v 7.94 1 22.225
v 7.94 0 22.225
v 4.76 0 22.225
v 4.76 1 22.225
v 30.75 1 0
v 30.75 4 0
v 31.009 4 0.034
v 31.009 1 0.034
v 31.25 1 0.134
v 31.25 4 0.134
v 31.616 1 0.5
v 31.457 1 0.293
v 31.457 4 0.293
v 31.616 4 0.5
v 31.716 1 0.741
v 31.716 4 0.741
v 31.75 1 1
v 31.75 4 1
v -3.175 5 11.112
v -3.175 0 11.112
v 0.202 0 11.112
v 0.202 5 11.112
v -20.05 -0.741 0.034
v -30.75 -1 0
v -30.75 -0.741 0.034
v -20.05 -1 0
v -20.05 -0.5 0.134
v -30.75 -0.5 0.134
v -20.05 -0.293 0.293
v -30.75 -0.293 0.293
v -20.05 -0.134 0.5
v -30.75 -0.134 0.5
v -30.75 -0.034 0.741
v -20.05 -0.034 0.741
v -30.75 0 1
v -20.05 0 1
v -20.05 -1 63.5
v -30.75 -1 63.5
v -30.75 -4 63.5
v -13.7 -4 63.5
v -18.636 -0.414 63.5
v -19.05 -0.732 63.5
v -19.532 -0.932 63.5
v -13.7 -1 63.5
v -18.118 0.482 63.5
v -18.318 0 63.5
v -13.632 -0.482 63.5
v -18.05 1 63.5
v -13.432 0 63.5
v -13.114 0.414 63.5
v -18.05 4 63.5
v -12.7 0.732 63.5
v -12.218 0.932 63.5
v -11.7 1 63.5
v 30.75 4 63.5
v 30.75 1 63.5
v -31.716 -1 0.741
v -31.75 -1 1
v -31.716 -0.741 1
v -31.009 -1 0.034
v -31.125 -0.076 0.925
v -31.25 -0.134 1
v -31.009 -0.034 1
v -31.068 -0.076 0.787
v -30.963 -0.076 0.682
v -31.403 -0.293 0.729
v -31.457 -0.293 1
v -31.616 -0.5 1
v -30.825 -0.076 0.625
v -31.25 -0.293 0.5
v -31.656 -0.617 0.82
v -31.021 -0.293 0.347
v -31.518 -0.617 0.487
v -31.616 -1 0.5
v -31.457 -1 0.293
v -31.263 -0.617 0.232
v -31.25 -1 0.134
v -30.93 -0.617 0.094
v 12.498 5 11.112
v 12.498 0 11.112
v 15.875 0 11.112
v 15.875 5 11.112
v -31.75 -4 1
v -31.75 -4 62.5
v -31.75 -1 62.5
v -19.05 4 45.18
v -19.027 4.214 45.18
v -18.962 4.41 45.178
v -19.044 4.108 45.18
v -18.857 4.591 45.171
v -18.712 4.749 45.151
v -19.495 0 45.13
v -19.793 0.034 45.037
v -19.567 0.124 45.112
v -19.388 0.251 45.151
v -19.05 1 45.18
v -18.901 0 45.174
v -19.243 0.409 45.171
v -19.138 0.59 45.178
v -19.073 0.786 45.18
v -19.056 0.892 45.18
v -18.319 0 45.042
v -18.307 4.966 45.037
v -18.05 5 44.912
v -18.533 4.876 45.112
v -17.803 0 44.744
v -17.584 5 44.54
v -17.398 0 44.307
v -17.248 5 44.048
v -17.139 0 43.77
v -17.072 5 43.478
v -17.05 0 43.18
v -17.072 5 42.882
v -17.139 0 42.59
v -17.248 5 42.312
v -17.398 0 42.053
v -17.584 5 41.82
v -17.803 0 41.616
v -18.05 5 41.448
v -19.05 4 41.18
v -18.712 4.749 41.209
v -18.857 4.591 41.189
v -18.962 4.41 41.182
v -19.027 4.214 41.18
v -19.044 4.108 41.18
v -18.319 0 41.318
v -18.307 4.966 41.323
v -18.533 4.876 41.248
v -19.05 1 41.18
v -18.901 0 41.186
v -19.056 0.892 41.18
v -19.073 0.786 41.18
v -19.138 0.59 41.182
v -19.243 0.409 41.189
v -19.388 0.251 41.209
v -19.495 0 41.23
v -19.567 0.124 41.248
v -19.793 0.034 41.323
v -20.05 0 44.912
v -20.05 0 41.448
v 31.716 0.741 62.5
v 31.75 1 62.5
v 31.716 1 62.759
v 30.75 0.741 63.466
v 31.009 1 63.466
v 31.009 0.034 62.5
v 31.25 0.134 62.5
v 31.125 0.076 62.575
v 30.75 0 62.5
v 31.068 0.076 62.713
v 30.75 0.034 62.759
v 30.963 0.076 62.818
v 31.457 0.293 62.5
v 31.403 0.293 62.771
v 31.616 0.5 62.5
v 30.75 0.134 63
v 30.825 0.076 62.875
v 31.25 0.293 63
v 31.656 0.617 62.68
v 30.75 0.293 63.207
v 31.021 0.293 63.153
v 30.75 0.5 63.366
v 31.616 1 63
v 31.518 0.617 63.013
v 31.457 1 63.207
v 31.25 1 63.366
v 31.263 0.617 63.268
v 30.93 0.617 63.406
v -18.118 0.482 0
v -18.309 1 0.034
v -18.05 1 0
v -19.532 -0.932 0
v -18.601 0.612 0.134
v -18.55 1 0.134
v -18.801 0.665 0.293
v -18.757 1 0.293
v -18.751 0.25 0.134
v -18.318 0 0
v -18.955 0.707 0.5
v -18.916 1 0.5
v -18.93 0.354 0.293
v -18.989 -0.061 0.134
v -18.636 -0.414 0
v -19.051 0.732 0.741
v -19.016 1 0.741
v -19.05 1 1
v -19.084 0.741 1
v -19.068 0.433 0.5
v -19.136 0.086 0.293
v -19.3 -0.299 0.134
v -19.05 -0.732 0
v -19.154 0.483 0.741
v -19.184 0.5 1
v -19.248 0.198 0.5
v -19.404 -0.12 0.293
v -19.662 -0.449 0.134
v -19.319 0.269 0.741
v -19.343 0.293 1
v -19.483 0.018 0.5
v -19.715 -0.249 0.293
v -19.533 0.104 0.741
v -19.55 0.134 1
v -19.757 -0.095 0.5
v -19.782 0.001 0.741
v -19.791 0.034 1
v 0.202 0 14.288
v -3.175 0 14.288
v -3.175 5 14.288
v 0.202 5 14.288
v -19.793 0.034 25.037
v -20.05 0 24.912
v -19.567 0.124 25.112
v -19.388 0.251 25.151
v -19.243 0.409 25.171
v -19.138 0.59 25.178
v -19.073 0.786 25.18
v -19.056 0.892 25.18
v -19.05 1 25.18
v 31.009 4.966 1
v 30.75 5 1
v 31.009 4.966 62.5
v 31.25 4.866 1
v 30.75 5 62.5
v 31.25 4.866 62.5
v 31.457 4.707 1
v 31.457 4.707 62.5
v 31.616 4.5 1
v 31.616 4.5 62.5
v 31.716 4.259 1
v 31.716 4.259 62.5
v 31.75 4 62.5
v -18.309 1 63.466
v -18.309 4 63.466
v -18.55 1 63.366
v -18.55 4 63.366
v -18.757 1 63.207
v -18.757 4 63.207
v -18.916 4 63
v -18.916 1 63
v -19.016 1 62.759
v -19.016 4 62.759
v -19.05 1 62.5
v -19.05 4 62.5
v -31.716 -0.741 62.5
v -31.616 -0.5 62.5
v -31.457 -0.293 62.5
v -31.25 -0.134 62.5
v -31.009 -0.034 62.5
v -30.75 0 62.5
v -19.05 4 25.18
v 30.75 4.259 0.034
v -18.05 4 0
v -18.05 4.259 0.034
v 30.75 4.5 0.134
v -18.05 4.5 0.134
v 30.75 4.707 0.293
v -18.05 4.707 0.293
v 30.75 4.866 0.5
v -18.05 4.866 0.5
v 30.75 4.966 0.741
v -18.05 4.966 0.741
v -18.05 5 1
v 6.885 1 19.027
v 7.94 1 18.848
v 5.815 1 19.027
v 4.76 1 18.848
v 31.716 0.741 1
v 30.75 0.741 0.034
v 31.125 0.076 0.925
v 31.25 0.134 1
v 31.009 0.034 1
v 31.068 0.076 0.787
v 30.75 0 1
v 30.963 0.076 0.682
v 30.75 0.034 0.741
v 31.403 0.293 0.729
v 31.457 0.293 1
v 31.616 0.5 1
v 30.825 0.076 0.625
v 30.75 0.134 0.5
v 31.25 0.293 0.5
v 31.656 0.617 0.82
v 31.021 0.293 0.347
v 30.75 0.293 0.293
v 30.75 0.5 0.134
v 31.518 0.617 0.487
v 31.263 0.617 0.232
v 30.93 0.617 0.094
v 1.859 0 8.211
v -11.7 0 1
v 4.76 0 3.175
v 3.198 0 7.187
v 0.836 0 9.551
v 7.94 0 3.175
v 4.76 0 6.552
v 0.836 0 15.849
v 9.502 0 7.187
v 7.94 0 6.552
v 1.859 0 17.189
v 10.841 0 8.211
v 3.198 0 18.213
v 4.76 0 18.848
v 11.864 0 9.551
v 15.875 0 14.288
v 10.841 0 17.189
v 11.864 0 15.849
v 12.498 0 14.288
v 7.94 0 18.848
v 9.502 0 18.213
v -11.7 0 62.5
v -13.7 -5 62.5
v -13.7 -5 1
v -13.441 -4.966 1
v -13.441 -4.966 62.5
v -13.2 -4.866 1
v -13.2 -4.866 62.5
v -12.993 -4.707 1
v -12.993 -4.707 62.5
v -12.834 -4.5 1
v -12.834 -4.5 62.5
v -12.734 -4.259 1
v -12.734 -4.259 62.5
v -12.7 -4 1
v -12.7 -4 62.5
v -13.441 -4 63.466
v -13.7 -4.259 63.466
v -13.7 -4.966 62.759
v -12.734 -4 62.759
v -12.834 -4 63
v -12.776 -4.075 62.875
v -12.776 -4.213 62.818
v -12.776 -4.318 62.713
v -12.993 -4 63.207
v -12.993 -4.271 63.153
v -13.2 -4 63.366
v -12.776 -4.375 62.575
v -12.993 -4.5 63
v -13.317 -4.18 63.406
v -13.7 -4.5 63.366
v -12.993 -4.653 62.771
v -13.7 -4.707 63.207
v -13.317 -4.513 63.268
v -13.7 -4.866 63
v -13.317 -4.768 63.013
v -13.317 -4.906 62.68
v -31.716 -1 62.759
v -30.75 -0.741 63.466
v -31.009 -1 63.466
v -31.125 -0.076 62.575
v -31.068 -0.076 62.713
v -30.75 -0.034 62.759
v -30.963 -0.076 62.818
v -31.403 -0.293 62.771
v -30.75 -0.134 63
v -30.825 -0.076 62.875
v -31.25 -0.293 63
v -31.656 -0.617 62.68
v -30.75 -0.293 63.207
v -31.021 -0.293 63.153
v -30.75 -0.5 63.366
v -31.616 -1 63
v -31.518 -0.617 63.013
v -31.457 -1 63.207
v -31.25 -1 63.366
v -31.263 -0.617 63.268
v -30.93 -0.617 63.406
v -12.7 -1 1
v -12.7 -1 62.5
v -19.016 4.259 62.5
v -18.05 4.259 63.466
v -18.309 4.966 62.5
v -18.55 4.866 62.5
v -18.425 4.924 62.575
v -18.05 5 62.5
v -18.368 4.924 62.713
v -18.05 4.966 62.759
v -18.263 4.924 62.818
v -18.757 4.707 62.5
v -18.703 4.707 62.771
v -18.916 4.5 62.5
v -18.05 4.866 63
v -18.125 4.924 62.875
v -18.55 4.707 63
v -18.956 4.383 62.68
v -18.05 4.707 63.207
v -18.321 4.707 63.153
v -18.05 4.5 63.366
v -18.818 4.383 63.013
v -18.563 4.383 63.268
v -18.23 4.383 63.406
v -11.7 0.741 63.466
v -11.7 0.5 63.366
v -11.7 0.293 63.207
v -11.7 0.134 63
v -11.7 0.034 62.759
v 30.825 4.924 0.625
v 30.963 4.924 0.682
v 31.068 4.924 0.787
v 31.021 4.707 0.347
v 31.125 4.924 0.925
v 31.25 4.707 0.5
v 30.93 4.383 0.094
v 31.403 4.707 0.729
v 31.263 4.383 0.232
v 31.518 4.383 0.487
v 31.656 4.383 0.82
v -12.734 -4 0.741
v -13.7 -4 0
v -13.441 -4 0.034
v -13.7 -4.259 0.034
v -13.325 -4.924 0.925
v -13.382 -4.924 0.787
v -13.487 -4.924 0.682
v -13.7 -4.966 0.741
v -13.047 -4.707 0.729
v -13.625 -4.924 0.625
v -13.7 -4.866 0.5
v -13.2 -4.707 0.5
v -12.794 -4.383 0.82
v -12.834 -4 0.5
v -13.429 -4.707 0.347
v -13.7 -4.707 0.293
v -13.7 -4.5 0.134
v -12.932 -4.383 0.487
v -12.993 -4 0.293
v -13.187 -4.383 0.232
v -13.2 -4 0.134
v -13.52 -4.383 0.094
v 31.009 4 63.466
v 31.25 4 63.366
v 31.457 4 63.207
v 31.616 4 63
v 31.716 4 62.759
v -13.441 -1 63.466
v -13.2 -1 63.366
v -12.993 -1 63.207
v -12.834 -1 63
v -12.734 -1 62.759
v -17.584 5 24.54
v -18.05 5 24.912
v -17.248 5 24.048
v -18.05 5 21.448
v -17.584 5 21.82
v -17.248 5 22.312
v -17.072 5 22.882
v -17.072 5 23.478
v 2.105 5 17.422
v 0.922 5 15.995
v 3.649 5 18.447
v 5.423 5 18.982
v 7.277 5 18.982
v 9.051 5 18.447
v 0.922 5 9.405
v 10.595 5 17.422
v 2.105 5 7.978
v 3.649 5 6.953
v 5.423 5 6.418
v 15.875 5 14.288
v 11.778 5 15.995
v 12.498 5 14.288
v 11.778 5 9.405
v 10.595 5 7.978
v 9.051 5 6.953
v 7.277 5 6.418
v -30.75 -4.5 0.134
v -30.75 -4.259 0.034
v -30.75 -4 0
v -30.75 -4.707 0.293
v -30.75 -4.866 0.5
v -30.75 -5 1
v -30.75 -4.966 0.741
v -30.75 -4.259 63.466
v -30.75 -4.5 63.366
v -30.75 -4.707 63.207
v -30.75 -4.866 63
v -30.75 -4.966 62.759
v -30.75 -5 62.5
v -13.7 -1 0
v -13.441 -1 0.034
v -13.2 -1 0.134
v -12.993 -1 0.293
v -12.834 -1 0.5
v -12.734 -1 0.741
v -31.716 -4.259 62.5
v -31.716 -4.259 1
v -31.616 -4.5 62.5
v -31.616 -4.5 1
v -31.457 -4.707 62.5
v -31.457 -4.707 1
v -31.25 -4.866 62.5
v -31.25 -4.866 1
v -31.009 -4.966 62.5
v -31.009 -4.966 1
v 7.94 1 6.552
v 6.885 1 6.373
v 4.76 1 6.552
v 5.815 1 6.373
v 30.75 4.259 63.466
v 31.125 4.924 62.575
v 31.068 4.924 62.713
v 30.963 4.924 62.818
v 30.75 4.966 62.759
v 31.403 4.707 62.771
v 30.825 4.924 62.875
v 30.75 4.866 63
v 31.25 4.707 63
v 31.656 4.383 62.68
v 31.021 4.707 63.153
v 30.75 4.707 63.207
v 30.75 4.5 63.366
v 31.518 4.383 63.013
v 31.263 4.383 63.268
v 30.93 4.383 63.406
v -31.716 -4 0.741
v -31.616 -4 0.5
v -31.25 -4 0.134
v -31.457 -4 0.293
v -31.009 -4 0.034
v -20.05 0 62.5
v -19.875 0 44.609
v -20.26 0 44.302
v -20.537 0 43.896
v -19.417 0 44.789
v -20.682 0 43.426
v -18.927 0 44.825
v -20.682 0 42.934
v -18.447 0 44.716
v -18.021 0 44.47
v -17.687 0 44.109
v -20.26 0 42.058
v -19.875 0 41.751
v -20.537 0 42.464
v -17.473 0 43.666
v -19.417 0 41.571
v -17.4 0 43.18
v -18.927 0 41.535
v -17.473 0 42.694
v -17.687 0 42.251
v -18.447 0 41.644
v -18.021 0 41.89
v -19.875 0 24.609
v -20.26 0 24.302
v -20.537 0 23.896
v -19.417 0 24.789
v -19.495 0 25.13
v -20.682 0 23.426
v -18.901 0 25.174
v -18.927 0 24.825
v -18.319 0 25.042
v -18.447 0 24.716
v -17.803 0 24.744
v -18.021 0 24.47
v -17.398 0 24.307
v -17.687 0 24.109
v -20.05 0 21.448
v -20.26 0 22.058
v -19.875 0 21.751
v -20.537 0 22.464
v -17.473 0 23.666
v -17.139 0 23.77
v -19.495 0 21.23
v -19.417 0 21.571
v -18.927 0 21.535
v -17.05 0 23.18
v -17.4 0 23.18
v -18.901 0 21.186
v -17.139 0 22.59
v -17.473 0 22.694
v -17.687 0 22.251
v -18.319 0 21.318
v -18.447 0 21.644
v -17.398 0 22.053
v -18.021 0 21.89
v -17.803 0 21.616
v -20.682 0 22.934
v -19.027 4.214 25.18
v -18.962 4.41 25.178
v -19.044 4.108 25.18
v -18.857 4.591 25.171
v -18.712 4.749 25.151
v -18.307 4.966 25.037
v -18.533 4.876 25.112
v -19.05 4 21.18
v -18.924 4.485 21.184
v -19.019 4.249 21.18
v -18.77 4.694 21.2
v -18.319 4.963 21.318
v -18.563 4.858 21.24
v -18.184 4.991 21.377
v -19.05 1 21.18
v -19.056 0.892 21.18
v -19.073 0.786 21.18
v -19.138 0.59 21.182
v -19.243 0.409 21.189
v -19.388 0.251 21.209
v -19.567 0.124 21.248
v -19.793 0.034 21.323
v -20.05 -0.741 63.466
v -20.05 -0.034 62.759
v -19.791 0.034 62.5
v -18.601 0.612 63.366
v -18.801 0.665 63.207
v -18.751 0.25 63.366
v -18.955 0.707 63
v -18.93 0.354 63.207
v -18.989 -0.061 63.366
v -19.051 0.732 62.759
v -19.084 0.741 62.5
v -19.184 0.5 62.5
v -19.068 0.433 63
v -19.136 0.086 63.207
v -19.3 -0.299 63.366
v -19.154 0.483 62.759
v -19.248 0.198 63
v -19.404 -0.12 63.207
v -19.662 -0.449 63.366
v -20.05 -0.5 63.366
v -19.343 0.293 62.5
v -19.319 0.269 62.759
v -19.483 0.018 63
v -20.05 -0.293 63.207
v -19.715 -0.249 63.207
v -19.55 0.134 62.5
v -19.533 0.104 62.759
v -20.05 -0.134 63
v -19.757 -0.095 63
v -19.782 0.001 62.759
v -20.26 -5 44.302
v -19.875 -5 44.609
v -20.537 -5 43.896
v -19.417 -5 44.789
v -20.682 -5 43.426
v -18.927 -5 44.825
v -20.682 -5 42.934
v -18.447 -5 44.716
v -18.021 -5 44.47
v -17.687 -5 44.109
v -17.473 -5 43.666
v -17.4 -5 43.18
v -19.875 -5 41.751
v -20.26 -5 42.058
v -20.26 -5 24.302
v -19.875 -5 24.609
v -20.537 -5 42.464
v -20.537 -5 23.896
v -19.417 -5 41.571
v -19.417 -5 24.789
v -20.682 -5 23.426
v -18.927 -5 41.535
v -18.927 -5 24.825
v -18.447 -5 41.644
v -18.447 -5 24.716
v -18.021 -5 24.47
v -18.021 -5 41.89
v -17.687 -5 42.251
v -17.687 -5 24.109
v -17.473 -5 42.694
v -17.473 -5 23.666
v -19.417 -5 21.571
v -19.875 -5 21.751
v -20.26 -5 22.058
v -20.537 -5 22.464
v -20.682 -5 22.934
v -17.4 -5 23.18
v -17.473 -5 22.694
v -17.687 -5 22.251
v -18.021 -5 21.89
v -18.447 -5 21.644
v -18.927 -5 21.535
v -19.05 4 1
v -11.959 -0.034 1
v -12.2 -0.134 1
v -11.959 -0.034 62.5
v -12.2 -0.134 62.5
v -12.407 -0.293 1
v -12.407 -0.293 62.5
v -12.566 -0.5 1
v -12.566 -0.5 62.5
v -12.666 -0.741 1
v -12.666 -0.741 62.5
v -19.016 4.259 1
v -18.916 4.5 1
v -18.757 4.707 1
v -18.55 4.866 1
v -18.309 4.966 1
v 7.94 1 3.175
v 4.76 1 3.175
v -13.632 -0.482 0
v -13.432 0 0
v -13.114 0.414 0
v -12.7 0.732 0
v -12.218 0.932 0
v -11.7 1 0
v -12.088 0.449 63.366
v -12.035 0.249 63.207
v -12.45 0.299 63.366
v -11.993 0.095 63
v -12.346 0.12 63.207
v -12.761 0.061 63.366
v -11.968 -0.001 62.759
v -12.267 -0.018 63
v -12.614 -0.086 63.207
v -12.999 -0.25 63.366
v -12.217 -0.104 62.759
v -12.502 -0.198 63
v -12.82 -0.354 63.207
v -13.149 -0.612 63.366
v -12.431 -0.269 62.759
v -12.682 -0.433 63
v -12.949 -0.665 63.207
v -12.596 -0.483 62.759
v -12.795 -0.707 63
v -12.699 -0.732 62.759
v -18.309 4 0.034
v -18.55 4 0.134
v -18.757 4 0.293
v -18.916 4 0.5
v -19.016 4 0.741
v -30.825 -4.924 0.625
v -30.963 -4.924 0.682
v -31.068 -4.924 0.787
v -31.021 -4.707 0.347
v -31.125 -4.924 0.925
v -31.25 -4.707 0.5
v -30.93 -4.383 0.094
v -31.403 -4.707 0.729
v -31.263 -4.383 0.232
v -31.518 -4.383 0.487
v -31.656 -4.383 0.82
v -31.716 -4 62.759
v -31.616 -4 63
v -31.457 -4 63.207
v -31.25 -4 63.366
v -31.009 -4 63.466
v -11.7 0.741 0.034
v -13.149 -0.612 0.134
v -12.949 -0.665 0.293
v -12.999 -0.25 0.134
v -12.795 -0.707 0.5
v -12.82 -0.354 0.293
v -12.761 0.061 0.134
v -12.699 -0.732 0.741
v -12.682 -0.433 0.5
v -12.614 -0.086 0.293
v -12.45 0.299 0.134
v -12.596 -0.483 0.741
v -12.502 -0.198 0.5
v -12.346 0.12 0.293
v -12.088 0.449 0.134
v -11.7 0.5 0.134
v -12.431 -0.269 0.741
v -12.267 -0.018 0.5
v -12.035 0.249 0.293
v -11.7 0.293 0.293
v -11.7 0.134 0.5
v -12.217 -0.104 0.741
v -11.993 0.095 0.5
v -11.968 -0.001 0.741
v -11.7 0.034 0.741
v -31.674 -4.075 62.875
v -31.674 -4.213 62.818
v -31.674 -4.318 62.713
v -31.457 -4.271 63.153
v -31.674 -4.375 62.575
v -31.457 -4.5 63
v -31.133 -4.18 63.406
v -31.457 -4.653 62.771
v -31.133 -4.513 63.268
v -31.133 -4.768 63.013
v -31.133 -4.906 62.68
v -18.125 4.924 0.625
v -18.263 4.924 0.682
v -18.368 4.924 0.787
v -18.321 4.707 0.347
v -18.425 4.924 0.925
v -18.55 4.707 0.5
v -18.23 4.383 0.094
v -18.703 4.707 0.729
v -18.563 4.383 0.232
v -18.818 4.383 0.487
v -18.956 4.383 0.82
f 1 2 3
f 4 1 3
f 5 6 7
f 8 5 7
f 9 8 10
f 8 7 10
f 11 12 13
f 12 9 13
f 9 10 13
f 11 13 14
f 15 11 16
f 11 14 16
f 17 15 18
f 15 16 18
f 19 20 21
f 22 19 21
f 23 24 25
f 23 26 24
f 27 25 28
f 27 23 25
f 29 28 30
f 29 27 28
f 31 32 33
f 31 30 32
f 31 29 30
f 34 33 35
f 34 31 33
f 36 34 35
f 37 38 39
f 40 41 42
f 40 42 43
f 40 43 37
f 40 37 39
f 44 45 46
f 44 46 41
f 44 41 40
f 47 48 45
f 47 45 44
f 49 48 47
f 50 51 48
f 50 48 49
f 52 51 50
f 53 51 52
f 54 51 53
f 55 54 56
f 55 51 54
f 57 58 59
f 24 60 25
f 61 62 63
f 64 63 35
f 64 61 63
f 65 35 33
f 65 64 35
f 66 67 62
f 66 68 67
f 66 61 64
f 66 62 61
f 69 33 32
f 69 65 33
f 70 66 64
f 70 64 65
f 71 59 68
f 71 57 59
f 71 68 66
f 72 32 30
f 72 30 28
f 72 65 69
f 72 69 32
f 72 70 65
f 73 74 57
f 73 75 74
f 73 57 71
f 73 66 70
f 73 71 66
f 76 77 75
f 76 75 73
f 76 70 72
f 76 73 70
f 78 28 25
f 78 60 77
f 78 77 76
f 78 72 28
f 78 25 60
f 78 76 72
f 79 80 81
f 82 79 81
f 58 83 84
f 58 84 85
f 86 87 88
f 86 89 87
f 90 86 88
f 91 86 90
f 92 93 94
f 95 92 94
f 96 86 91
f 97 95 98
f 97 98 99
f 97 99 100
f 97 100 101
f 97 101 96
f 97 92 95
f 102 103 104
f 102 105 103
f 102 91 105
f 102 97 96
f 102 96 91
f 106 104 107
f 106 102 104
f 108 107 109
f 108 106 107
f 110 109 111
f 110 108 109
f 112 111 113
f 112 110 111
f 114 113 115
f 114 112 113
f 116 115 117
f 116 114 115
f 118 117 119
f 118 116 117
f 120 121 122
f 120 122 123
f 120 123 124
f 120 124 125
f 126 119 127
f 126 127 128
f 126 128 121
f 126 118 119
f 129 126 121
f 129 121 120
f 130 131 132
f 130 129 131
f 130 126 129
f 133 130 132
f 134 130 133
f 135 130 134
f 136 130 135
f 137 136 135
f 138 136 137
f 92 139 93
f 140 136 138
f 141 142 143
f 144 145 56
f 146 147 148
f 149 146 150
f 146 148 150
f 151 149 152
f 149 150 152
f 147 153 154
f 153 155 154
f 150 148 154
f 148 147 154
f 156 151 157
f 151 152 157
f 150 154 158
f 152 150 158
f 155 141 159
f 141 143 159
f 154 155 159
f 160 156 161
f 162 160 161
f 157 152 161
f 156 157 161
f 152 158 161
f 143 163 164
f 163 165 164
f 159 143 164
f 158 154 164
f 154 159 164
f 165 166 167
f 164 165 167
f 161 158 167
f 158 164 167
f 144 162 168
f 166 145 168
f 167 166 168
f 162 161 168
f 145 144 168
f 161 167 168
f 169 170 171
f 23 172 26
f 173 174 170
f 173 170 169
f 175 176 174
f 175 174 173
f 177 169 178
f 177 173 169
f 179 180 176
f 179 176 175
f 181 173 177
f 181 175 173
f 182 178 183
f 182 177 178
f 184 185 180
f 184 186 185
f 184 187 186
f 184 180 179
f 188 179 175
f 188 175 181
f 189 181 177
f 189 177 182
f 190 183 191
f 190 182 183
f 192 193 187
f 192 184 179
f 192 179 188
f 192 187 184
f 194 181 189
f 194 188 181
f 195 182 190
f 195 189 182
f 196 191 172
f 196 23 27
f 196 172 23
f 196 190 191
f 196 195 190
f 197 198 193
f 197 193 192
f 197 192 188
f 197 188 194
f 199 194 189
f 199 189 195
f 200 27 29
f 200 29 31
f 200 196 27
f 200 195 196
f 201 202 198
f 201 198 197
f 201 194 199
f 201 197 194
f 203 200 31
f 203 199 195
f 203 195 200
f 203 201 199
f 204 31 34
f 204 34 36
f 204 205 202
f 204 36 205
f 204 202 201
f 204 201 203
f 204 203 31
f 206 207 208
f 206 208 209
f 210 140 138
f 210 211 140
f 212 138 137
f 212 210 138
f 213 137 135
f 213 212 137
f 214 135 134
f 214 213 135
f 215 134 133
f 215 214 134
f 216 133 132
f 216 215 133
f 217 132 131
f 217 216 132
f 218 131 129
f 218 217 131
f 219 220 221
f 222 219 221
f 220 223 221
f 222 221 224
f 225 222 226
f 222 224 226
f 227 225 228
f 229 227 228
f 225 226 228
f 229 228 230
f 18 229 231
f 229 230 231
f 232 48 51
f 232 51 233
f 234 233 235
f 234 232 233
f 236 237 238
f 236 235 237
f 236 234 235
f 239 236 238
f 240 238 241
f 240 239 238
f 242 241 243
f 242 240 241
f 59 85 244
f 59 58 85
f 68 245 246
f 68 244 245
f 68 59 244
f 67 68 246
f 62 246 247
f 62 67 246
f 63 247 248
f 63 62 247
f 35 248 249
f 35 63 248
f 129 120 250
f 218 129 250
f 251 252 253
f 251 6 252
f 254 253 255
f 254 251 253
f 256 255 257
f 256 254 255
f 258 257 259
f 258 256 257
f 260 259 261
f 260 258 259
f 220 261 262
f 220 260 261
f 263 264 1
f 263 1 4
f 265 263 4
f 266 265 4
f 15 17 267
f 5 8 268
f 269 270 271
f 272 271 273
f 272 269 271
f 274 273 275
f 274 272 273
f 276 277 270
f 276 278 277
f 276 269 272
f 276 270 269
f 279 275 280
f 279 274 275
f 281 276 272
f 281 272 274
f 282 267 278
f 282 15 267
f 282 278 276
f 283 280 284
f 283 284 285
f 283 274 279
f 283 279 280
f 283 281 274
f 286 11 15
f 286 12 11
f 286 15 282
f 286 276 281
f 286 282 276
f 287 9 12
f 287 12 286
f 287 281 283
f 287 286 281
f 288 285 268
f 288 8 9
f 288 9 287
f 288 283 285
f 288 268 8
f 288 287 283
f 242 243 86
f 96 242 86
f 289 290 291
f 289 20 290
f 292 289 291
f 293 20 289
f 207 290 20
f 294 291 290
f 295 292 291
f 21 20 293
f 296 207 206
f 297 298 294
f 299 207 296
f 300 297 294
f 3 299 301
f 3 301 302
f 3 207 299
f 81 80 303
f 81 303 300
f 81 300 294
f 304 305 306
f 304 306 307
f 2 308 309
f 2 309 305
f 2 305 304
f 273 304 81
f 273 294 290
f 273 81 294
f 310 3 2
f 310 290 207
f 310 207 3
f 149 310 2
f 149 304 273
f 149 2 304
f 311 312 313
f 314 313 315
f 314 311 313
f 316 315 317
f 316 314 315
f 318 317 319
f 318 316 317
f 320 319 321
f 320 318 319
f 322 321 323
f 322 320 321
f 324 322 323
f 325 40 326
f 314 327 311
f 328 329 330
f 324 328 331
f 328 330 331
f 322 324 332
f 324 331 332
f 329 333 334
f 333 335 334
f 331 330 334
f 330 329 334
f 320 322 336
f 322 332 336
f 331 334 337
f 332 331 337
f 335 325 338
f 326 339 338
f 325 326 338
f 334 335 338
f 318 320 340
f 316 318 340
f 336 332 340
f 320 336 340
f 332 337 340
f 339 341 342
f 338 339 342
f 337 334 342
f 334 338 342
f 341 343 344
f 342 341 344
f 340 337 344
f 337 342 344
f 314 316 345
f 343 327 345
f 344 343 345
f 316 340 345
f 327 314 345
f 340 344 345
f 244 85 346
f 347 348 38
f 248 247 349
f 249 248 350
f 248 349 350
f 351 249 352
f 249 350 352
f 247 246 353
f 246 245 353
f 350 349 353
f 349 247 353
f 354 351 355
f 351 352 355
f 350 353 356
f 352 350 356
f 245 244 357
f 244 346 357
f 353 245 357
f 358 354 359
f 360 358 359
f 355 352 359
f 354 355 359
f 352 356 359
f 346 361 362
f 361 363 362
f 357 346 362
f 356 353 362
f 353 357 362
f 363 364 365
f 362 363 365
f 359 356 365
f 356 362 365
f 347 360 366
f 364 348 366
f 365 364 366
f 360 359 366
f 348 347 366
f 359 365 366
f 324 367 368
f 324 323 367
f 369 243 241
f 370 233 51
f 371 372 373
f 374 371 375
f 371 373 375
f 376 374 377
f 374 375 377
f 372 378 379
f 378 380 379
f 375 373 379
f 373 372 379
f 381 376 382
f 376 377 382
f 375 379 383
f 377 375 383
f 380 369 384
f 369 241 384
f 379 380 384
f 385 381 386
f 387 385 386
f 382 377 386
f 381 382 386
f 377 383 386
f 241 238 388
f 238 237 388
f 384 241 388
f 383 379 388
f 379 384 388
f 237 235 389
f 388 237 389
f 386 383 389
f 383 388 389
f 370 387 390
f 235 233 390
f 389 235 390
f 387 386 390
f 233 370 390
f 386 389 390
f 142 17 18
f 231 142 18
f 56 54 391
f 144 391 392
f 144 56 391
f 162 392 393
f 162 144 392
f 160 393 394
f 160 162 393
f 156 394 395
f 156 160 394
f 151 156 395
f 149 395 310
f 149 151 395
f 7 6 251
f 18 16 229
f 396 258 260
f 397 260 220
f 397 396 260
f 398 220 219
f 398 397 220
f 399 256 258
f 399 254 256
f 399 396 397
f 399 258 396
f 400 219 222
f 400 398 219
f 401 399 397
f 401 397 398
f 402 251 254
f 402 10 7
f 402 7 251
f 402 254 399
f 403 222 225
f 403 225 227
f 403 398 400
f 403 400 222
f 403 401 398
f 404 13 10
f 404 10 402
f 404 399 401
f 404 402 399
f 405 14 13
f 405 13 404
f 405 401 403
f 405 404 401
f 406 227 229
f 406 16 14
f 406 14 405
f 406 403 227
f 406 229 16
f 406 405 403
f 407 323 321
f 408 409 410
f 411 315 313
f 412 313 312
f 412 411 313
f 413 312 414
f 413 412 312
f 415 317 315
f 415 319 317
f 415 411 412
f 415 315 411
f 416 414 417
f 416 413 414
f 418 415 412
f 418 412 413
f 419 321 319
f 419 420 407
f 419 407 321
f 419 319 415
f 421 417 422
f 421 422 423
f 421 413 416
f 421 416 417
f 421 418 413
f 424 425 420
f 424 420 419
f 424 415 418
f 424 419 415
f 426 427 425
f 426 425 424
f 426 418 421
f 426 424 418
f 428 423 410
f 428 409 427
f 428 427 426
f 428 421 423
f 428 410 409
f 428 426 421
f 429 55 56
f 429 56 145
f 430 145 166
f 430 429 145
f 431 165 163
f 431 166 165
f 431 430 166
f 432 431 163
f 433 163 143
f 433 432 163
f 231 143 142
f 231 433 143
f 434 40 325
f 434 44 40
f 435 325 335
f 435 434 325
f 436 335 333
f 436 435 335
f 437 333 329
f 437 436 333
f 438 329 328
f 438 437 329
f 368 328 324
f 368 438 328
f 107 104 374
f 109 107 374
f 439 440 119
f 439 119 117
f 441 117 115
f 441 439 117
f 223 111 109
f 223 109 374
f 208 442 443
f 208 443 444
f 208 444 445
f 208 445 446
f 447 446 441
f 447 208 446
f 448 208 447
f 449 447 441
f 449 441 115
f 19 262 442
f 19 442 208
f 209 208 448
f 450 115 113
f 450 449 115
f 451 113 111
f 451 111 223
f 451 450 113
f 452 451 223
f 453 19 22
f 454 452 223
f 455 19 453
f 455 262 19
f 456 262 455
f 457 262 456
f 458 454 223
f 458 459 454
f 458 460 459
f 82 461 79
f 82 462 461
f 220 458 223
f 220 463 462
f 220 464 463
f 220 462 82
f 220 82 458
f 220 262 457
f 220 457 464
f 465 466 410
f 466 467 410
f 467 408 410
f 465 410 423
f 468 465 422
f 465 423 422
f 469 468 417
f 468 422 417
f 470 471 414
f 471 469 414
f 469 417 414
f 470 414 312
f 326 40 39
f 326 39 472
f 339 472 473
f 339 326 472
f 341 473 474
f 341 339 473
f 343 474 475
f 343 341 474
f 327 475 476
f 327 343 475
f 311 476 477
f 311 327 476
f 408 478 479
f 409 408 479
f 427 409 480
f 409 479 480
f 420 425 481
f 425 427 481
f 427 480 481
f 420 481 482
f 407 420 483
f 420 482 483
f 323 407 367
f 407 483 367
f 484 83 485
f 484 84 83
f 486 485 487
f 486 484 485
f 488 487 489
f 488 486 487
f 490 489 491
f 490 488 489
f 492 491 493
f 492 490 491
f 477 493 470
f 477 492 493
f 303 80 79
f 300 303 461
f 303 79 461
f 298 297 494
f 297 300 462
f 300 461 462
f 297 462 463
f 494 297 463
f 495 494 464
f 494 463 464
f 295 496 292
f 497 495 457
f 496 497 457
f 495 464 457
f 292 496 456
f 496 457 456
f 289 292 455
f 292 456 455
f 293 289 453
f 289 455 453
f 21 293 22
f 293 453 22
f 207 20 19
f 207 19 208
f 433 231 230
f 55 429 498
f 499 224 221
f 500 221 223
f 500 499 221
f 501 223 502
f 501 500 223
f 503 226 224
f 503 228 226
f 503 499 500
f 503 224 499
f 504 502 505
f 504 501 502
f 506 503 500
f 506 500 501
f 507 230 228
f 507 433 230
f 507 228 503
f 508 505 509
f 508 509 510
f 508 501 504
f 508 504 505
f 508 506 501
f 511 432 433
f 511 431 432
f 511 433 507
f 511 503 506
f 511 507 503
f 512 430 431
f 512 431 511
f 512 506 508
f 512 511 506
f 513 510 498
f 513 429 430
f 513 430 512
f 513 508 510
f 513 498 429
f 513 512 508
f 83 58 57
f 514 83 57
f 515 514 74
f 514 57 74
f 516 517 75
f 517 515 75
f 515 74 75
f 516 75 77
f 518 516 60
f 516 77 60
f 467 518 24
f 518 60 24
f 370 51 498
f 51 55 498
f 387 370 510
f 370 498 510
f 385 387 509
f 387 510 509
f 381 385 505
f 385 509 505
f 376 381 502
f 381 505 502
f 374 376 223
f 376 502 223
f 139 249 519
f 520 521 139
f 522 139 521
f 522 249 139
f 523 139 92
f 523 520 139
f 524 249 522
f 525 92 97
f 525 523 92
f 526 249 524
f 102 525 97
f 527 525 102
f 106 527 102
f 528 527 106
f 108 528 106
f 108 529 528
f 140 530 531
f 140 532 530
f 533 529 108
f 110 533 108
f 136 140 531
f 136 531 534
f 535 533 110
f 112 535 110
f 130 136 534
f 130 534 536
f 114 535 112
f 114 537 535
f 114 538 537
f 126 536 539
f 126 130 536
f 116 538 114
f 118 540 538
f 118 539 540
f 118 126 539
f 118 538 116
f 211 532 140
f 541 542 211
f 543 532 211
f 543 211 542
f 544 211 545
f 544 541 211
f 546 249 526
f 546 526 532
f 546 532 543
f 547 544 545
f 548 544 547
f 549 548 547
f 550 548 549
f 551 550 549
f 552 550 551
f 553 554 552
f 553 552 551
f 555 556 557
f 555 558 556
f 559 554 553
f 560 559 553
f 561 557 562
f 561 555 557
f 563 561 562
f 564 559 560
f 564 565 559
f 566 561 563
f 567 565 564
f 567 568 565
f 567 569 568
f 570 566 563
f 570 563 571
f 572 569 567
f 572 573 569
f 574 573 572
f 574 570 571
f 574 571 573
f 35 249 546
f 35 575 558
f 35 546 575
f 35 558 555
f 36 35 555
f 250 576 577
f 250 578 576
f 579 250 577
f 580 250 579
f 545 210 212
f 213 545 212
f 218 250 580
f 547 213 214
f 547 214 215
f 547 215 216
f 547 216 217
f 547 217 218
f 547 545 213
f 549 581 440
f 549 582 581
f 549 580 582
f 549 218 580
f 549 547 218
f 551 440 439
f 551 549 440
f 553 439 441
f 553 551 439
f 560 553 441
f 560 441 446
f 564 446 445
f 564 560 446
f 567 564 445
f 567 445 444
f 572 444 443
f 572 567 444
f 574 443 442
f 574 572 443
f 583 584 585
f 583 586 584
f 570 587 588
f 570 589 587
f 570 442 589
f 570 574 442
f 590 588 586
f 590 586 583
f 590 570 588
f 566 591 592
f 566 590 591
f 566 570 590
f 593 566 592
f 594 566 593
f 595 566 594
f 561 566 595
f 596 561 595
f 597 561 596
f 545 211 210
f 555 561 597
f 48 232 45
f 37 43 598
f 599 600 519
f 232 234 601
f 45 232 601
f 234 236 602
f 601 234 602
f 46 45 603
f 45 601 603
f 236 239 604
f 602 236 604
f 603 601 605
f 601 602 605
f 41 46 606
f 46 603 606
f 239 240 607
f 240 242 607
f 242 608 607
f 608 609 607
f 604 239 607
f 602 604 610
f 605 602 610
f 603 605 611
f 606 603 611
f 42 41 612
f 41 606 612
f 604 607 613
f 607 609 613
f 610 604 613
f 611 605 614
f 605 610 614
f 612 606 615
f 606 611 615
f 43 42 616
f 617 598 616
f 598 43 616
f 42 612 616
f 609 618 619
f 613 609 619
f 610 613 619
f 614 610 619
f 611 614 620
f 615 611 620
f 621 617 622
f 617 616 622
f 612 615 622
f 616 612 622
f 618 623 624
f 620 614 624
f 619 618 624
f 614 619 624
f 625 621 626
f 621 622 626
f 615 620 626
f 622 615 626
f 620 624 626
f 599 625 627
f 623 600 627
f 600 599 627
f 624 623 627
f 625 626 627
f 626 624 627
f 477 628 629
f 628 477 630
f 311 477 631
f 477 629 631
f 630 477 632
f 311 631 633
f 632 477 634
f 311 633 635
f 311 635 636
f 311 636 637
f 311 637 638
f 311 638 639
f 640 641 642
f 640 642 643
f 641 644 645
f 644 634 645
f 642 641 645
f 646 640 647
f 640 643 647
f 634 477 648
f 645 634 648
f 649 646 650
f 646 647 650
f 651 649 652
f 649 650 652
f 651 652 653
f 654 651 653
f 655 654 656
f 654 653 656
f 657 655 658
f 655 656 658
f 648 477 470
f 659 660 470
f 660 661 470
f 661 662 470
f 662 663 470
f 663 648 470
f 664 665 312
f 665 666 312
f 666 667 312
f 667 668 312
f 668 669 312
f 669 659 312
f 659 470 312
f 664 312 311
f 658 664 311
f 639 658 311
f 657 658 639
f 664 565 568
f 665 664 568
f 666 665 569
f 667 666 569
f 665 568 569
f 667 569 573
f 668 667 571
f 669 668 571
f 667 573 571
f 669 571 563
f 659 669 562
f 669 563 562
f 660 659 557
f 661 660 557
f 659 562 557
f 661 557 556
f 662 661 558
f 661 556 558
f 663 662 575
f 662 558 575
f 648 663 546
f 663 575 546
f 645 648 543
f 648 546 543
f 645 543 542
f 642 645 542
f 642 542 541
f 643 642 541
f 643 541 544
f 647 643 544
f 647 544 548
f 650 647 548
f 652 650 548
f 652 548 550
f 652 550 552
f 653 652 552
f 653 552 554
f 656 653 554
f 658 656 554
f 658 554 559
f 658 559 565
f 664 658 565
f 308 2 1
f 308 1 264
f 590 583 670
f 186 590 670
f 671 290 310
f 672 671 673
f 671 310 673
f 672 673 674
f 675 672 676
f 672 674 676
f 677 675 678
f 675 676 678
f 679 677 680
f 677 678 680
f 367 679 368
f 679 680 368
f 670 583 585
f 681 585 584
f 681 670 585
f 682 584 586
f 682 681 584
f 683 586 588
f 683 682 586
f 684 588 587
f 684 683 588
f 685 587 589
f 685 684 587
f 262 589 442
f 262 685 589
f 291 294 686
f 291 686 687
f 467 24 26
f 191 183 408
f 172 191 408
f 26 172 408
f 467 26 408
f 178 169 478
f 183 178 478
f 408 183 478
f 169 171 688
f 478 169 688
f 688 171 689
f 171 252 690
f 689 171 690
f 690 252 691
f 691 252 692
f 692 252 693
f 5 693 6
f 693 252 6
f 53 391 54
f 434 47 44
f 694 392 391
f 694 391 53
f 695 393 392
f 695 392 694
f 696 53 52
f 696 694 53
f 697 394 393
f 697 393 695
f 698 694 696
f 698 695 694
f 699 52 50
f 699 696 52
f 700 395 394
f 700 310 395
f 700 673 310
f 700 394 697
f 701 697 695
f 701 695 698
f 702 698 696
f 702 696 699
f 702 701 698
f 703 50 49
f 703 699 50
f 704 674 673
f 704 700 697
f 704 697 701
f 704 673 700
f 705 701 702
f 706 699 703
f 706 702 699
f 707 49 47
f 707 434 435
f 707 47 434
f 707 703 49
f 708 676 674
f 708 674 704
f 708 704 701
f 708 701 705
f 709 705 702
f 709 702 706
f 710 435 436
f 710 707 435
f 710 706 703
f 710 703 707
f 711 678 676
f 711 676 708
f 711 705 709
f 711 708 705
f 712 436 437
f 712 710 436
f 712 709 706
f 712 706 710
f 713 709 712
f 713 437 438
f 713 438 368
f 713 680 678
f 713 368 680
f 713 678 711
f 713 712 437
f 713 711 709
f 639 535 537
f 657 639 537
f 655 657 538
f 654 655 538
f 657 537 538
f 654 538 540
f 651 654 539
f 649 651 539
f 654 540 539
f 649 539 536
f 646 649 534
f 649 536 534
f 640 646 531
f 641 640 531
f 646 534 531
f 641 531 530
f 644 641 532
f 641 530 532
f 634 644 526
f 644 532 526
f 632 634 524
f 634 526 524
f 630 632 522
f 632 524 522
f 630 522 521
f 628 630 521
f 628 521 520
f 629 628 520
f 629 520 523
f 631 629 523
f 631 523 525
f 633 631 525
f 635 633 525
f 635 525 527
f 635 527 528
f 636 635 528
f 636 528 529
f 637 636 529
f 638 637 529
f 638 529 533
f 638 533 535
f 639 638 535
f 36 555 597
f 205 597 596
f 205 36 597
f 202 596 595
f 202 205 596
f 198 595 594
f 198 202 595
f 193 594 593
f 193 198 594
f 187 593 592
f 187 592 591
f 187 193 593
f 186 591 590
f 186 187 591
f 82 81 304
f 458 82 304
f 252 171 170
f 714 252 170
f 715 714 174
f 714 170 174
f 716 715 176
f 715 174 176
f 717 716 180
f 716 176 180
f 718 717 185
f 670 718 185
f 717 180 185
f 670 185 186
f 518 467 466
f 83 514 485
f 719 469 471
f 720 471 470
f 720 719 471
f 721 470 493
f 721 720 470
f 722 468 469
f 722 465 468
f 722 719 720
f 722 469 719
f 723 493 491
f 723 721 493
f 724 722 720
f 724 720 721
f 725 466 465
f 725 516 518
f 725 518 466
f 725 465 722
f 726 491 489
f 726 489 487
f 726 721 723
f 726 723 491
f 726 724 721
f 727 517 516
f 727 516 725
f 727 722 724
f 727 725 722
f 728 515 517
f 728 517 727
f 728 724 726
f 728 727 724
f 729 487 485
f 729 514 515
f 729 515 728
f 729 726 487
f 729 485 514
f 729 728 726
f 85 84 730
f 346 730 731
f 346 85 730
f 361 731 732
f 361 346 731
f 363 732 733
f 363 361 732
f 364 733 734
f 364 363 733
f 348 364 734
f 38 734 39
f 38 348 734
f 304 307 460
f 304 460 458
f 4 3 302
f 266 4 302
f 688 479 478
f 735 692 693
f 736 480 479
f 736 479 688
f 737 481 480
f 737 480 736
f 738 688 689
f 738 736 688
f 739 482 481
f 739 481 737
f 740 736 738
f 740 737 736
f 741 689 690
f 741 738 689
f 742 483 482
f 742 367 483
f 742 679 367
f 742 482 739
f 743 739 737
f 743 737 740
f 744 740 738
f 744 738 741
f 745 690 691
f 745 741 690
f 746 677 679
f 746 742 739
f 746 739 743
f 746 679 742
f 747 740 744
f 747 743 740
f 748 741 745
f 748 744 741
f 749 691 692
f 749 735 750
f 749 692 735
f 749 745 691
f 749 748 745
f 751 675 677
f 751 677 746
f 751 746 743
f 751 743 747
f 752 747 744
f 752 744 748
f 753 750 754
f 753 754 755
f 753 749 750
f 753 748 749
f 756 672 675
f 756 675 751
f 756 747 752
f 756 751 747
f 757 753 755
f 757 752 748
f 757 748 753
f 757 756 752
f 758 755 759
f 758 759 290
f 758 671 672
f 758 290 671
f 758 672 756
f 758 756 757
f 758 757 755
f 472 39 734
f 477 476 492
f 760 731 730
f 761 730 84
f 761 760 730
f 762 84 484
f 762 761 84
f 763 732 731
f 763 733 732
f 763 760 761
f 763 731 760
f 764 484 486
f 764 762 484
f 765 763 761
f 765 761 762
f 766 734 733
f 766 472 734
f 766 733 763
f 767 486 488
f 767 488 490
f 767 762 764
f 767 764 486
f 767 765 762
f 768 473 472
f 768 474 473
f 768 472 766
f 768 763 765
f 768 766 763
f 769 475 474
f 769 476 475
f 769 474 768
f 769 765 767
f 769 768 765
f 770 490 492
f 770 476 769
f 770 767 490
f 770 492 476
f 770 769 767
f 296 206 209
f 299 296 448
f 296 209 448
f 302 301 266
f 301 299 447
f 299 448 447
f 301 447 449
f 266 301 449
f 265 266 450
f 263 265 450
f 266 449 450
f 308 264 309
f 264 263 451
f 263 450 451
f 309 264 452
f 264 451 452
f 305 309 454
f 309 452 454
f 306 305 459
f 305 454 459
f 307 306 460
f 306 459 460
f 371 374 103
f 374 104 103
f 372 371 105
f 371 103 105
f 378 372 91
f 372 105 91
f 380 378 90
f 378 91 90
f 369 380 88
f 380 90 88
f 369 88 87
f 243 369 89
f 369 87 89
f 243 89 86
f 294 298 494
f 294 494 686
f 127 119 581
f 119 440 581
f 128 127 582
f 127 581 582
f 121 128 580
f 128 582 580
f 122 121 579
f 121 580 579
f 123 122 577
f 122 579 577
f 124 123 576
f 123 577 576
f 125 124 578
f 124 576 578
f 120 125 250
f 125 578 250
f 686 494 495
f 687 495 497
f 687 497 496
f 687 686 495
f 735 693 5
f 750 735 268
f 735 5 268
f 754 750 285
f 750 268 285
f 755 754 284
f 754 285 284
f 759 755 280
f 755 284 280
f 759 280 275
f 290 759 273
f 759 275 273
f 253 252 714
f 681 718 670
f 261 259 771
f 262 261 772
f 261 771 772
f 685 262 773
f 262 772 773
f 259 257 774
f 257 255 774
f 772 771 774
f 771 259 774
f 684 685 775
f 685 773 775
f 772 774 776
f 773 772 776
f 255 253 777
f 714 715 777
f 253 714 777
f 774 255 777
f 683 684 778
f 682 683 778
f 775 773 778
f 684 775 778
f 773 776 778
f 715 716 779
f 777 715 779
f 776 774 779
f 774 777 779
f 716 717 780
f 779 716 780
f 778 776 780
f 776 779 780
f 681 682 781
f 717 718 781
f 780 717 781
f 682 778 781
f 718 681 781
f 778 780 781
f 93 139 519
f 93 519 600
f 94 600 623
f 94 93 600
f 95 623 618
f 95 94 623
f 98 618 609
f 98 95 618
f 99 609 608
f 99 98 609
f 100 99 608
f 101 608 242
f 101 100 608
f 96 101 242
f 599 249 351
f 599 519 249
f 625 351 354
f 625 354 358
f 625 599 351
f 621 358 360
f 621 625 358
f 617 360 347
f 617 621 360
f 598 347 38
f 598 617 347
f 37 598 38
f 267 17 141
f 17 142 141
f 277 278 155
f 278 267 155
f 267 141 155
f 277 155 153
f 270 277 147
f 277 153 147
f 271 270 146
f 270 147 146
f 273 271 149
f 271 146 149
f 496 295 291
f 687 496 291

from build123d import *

# Parameters (mm, degrees)
SKETCH1_W           = 63.5
SKETCH1_H           = 10
BOSS_EXTRUDE1_DEPTH = 63.5
SKETCH2_W           = 12.7
SKETCH2_H           = 63.5
CUT_EXTRUDE1_DEPTH  = 5
SKETCH3_W           = 44.45
SKETCH3_H           = 63.5
CUT_EXTRUDE2_DEPTH  = 5
SKETCH4_R           = 6.35
CUT_EXTRUDE3_DEPTH  = 5
SKETCH5_W           = 19.05
SKETCH5_H           = 3.175
CUT_EXTRUDE4_DEPTH  = 5
SKETCH6_R           = 2
CUT_EXTRUDE5_DEPTH  = 6
SKETCH7_R           = 1.65
CUT_EXTRUDE6_DEPTH  = 6
FILLET1_R           = 1
SKETCH8_W           = 3.18
SKETCH8_H           = 19.05
CUT_EXTRUDE7_DEPTH  = 1


with BuildPart() as part:
    # Sketch1 → Boss-Extrude1 (new body)
    with BuildSketch(Plane.XY):
        Rectangle(SKETCH1_W, SKETCH1_H)
    extrude(amount=BOSS_EXTRUDE1_DEPTH)

    # Sketch2 → Cut-Extrude1 (cut)
    with BuildSketch(Plane(origin=(0, 5, 0), x_dir=(1, 0, 0), z_dir=(0, 1, 0))):
        with Locations((-25.4, -31.75)):
            Rectangle(SKETCH2_W, SKETCH2_H)
    extrude(amount=-CUT_EXTRUDE1_DEPTH, mode=Mode.SUBTRACT)

    # Sketch3 → Cut-Extrude2 (cut)
    with BuildSketch(Plane.XZ.offset(5)):
        with Locations((9.525, 31.75)):
            Rectangle(SKETCH3_W, SKETCH3_H)
    extrude(amount=-CUT_EXTRUDE2_DEPTH, mode=Mode.SUBTRACT)

    # Sketch4 → Cut-Extrude3 (cut)
    with BuildSketch(Plane(origin=(0, 5, 0), x_dir=(1, 0, 0), z_dir=(0, 1, 0))):
        with Locations((6.35, -12.7)):
            Circle(SKETCH4_R)
    extrude(amount=-CUT_EXTRUDE3_DEPTH, mode=Mode.SUBTRACT)

    # Sketch5 → Cut-Extrude4 (cut)
    with BuildSketch(Plane.XZ):
        with Locations((6.35, 12.7)):
            Rectangle(SKETCH5_W, SKETCH5_H)
    extrude(amount=-CUT_EXTRUDE4_DEPTH, mode=Mode.SUBTRACT)

    # Sketch6 → Cut-Extrude5 (cut, through all)
    with BuildSketch(Plane(origin=(0, 0, 0), x_dir=(1, 0, 0), z_dir=(0, 1, 0))):
        with Locations((-19.05, -43.18)):
            Circle(SKETCH6_R)
        with Locations((-19.05, -23.18)):
            Circle(SKETCH6_R)
    extrude(amount=CUT_EXTRUDE5_DEPTH, mode=Mode.SUBTRACT)

    # Sketch7 → Cut-Extrude6 (cut, through all)
    with BuildSketch(Plane(origin=(0, 0, 0), x_dir=(1, 0, 0), z_dir=(0, 1, 0))):
        with Locations((-19.05, -23.18)):
            Circle(SKETCH7_R)
        with Locations((-19.05, -43.18)):
            Circle(SKETCH7_R)
    extrude(amount=-CUT_EXTRUDE6_DEPTH, mode=Mode.SUBTRACT)

    # Fillet1
    fillet1_edges = [part.edges().sort_by_distance(p)[0] for p in [
        (-31.75, -2.5, 0),
        (-22.225, -5, 63.5),
        (-31.75, -2.5, 63.5),
        (-19.05, 2.5, 0),
        (-19.05, 2.5, 63.5),
        (-19.05, 5, 54.34),
        (-31.75, 0, 31.75),
        (-25.4, 0, 0),
        (-19.05, 0, 10.59),
        (-25.4, 0, 63.5),
        (31.75, 2.5, 0),
        (31.75, 2.5, 63.5),
        (31.75, 0, 31.75),
        (9.525, 0, 0),
        (-12.7, 0, 31.75),
        (-12.7, -2.5, 0),
        (9.525, 0, 63.5),
        (-12.7, -2.5, 63.5),
        (-12.7, -5, 31.75),
        (-22.225, -5, 0),
        (6.35, 5, 0),
        (-31.75, -5, 31.75),
        (31.75, 5, 31.75),
        (6.35, 5, 63.5),
        (-19.05, 0, 33.18),
        (-19.05, 0, 54.34),
        (-19.05, 5, 33.18),
        (-19.05, 5, 10.59),
    ]]
    fillet(fillet1_edges, radius=FILLET1_R)

    # Sketch8 → Cut-Extrude7 (cut)
    with BuildSketch(Plane(origin=(0, 0, 0), x_dir=(-1, 0, 0), z_dir=(0, -1, 0))):
        with Locations((-6.35, -12.7)):
            Rectangle(SKETCH8_W, SKETCH8_H)
    extrude(amount=-CUT_EXTRUDE7_DEPTH, mode=Mode.SUBTRACT)


solid = part.part
